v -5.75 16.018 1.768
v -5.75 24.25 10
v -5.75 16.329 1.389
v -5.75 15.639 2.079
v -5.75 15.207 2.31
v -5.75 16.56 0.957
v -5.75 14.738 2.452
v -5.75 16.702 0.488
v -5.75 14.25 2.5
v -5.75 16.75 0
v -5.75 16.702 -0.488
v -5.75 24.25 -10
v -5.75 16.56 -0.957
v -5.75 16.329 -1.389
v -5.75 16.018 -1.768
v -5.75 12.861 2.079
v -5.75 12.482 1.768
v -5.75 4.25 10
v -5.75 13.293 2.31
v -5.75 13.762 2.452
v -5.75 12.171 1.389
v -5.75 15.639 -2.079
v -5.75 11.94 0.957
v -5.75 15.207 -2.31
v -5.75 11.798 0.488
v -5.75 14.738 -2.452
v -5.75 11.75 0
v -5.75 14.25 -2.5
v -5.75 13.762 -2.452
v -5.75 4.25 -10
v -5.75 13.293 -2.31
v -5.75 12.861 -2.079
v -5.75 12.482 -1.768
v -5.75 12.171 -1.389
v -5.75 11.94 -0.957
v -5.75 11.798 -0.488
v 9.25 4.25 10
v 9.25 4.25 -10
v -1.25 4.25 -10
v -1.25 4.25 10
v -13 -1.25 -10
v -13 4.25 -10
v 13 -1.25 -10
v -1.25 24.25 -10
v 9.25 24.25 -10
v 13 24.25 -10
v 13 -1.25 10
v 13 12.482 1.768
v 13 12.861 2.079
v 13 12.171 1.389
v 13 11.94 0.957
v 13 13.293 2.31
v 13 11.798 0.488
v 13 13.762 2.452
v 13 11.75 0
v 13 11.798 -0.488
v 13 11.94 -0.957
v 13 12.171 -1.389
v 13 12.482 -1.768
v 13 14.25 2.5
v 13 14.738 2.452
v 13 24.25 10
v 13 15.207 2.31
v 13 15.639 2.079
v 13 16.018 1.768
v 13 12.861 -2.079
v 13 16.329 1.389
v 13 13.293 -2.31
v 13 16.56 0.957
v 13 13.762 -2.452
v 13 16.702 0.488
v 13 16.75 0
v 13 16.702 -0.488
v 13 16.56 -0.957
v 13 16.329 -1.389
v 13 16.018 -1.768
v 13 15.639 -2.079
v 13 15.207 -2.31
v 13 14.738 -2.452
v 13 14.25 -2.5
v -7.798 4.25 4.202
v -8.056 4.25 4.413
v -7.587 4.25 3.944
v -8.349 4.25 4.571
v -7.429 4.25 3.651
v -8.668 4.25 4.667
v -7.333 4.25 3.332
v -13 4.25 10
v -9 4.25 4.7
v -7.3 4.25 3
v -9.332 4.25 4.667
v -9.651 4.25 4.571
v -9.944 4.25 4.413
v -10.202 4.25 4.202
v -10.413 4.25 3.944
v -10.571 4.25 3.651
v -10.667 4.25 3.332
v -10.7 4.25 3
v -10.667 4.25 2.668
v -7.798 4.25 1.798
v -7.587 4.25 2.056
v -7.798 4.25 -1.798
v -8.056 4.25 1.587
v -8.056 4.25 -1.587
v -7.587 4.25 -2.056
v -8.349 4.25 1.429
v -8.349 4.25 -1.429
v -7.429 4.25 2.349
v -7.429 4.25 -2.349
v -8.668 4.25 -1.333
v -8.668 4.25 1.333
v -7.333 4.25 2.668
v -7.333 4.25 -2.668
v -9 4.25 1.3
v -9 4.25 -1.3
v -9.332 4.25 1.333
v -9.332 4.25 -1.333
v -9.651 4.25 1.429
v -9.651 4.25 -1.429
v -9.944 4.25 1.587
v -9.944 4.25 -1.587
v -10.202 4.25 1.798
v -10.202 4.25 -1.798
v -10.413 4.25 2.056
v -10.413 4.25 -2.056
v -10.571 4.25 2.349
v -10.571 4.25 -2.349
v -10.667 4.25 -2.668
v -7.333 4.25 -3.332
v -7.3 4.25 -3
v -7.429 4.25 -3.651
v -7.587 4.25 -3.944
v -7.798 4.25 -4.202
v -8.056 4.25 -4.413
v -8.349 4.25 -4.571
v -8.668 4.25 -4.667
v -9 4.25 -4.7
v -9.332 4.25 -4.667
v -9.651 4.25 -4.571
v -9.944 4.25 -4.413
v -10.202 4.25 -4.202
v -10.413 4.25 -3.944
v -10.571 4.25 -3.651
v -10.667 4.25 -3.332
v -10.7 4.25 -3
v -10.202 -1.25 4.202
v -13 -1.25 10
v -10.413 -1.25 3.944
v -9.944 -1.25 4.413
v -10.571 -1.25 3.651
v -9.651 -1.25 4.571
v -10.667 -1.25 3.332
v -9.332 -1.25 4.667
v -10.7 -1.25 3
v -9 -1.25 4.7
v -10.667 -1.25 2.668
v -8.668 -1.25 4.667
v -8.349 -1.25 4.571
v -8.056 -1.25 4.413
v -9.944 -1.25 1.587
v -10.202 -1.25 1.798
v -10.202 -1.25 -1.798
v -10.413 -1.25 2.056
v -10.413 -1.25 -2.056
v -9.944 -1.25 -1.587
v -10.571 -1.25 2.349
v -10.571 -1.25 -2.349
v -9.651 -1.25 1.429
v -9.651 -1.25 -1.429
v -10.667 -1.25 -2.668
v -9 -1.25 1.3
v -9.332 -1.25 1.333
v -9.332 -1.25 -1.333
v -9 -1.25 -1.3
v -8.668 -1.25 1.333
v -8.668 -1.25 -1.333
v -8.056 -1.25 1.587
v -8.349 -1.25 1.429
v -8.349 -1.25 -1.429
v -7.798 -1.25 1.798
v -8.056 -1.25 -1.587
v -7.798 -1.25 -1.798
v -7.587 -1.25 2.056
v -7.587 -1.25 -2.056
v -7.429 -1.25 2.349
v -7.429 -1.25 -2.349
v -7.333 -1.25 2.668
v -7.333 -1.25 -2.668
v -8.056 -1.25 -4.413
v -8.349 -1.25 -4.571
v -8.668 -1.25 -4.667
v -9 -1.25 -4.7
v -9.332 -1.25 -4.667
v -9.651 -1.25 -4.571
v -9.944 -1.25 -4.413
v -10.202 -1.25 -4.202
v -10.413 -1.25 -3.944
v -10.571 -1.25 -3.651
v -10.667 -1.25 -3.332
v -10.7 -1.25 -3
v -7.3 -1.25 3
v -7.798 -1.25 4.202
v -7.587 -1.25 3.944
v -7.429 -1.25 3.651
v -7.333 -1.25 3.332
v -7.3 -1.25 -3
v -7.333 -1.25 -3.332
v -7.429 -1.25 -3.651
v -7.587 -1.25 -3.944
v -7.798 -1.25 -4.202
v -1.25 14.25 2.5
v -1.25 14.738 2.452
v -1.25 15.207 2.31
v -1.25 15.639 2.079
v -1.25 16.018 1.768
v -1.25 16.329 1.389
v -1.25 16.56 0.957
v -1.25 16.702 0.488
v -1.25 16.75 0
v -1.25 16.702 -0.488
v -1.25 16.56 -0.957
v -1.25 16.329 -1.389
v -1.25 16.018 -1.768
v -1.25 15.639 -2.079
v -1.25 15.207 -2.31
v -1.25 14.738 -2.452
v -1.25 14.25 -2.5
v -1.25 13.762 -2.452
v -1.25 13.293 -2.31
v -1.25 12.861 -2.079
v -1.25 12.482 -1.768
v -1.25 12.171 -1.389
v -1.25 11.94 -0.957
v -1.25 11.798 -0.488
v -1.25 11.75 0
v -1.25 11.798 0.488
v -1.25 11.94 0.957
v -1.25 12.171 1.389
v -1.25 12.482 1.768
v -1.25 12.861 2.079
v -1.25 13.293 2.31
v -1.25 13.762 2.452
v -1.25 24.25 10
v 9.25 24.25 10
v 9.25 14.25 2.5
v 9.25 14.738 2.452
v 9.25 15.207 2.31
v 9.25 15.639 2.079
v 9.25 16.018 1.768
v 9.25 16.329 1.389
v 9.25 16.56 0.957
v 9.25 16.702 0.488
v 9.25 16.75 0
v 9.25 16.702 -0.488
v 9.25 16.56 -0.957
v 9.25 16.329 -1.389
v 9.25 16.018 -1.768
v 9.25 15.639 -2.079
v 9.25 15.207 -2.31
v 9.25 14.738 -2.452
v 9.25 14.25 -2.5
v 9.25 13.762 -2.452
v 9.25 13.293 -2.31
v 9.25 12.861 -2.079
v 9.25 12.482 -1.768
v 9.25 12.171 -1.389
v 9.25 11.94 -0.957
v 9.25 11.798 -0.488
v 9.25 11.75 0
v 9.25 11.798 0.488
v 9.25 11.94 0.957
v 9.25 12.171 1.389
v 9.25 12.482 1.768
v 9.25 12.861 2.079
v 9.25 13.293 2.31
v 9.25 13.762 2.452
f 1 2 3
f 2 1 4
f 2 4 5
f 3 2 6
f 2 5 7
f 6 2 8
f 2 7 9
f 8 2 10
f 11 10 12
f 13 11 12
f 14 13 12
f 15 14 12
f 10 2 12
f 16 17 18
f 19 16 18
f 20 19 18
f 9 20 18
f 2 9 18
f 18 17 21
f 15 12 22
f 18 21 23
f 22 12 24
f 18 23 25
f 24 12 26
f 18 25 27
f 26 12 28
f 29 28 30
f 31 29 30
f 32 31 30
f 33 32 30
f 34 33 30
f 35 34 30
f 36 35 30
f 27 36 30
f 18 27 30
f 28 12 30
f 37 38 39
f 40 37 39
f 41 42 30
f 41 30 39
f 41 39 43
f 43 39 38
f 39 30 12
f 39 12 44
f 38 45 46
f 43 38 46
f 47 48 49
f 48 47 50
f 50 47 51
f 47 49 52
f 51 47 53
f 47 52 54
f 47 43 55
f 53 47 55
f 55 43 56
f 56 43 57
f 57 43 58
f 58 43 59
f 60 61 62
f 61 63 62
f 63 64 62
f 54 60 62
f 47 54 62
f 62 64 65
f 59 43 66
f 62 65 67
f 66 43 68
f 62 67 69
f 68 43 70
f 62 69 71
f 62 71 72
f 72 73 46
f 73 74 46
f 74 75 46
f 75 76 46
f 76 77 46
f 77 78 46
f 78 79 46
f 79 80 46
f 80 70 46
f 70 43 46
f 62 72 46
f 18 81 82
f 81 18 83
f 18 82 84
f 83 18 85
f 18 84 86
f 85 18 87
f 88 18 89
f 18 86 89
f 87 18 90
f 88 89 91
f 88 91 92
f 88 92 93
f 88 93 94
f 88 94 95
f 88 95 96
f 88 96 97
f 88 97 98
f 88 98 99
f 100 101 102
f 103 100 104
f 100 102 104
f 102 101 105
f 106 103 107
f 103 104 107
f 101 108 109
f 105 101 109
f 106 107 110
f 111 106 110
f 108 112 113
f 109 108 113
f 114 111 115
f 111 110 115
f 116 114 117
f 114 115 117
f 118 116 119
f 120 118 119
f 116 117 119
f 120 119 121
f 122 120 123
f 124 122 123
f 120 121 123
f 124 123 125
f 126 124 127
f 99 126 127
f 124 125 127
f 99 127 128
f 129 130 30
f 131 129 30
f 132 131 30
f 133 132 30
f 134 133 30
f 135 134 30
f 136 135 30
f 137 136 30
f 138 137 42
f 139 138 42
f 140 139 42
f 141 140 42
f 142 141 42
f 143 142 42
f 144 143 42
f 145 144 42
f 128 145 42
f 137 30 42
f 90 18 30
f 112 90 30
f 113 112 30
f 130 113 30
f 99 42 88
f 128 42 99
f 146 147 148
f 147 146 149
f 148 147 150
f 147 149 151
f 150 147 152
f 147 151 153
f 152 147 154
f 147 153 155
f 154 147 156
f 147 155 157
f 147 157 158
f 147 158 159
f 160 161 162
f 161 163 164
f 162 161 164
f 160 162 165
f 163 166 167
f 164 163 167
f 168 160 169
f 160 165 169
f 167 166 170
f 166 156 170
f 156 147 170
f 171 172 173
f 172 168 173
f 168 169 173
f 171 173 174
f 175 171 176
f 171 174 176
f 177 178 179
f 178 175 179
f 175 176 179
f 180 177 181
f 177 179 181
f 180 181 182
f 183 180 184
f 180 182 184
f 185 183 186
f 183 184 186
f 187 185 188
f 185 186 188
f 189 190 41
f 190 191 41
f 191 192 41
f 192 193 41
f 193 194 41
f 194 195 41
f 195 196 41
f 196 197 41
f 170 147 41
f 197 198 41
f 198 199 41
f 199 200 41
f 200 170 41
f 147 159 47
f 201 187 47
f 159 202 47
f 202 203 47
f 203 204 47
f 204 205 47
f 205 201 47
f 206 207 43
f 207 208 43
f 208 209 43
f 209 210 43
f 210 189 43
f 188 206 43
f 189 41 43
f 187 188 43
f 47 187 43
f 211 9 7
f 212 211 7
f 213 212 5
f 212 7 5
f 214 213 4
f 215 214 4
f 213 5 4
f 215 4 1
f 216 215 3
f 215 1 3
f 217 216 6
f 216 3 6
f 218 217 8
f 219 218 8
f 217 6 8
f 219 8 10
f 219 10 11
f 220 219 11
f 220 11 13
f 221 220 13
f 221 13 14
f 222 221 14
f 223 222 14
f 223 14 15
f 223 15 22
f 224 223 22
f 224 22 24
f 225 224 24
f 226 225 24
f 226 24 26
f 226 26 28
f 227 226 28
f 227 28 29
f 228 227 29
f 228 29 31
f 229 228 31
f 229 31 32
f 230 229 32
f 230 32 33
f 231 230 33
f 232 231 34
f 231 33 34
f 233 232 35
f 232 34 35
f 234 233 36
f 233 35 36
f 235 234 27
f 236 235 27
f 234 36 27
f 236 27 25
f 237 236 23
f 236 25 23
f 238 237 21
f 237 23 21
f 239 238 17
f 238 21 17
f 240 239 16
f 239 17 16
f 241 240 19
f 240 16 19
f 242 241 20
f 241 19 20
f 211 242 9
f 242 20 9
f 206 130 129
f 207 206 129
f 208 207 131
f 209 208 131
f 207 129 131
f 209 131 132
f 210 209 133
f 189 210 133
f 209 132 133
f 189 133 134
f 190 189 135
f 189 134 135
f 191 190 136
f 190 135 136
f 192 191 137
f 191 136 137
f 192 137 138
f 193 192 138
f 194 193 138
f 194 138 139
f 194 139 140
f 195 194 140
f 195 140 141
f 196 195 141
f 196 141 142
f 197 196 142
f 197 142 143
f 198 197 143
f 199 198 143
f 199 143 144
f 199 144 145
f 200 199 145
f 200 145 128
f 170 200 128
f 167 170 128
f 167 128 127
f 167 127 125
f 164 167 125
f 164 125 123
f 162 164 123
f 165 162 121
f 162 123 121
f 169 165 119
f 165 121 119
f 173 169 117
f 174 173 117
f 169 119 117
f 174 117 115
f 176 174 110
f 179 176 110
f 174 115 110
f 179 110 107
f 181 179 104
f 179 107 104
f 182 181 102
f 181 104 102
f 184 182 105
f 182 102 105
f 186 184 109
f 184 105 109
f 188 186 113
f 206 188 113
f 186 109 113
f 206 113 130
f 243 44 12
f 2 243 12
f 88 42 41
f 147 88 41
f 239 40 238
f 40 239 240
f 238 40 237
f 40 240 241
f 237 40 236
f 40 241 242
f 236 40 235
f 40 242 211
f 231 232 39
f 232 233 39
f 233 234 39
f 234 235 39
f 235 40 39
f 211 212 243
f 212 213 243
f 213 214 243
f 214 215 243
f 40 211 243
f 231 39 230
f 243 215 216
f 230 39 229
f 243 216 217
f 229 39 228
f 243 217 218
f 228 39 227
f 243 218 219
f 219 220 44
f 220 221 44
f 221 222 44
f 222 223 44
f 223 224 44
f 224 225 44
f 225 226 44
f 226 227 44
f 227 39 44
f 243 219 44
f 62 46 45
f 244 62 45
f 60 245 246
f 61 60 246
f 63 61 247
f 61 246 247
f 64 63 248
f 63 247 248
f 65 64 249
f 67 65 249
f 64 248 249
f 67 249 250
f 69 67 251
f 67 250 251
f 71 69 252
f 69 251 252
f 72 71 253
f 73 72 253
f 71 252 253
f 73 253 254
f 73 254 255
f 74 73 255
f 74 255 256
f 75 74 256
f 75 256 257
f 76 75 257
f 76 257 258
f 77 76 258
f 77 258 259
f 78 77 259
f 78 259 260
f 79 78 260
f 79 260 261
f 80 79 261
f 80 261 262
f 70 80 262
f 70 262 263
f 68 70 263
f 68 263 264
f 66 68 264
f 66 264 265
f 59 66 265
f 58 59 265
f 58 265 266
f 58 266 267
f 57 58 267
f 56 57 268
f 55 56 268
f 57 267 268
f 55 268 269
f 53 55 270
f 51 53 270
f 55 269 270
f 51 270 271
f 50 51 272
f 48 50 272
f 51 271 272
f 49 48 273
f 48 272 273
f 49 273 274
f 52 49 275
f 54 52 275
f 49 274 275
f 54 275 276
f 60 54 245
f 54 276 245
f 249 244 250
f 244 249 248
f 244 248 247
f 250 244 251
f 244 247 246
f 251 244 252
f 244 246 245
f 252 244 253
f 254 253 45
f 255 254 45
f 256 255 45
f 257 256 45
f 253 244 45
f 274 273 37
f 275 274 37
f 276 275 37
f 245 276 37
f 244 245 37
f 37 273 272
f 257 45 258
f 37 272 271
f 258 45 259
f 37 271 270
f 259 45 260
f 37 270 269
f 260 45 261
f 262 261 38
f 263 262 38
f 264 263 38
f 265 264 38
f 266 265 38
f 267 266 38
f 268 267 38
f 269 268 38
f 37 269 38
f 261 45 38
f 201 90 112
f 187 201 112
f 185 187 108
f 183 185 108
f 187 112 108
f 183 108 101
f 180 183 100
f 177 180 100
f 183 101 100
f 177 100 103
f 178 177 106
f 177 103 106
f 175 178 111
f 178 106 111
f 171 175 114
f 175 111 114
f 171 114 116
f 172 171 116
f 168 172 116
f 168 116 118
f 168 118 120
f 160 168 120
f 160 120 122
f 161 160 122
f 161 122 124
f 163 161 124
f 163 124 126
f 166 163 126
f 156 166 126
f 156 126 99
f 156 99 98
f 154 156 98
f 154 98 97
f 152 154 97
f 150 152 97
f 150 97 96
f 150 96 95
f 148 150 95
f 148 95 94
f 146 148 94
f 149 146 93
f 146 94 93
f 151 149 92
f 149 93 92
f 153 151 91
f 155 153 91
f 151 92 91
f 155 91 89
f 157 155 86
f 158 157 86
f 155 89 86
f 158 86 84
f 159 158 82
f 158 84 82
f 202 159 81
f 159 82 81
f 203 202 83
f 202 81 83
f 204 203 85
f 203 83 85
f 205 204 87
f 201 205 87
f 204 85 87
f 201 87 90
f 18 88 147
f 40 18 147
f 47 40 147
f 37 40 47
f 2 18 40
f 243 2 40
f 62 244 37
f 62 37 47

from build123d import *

# Parameters (mm, degrees)
BODY_START           = -10
BODY_DEPTH           = 20
M3_CLEARANCE_HOLE1_D = 3.4
CUT_EXTRUDE1_REACH   = 34.243
SKETCH4_R            = 2.5


# Read off the part's stored shape, not the designer's step: Body
with BuildPart() as part:
    # Body outline → Body (new body)
    with BuildSketch(Plane.XY.offset(BODY_START)):
        Polygon((9.25, 24.25), (9.25, 4.25), (-1.25, 4.25), (-1.25, 24.25), (-5.75, 24.25), (-5.75, 4.25), (-13, 4.25), (-13, -1.25), (13, -1.25), (13, 24.25), align=None)
    extrude(amount=BODY_DEPTH)

    # M3 Clearance Hole1 (through all)
    with Locations(Plane(origin=(0, -1.25, 0), x_dir=(-1, 0, 0), z_dir=(0, -1, 0))):
        with Locations((9, -3), (9, 3)):
            Hole(M3_CLEARANCE_HOLE1_D / 2)

    # Cut-Extrude1: up to this face of the body (flat: up to its plane)
    cut_extrude1_end = Plane(part.part.faces().sort_by_distance((13, 11.5, 0))[0])
    # Sketch4 → Cut-Extrude1 (cut, up to the picked face)
    with BuildSketch(Plane.ZY.offset(5.75), mode=Mode.PRIVATE) as cut_extrude1_sk1:
        with Locations((0, 14.25)):
            Circle(SKETCH4_R)
    cut_extrude1_tool1 = split(extrude(cut_extrude1_sk1.sketch, amount=-CUT_EXTRUDE1_REACH, mode=Mode.PRIVATE), bisect_by=cut_extrude1_end, keep=Keep.BOTH, mode=Mode.PRIVATE)
    add(cut_extrude1_tool1.solids().sort_by(Axis((-5.75, 14.25, 0), (1, 0, 0)))[0], mode=Mode.SUBTRACT)


solid = part.part
